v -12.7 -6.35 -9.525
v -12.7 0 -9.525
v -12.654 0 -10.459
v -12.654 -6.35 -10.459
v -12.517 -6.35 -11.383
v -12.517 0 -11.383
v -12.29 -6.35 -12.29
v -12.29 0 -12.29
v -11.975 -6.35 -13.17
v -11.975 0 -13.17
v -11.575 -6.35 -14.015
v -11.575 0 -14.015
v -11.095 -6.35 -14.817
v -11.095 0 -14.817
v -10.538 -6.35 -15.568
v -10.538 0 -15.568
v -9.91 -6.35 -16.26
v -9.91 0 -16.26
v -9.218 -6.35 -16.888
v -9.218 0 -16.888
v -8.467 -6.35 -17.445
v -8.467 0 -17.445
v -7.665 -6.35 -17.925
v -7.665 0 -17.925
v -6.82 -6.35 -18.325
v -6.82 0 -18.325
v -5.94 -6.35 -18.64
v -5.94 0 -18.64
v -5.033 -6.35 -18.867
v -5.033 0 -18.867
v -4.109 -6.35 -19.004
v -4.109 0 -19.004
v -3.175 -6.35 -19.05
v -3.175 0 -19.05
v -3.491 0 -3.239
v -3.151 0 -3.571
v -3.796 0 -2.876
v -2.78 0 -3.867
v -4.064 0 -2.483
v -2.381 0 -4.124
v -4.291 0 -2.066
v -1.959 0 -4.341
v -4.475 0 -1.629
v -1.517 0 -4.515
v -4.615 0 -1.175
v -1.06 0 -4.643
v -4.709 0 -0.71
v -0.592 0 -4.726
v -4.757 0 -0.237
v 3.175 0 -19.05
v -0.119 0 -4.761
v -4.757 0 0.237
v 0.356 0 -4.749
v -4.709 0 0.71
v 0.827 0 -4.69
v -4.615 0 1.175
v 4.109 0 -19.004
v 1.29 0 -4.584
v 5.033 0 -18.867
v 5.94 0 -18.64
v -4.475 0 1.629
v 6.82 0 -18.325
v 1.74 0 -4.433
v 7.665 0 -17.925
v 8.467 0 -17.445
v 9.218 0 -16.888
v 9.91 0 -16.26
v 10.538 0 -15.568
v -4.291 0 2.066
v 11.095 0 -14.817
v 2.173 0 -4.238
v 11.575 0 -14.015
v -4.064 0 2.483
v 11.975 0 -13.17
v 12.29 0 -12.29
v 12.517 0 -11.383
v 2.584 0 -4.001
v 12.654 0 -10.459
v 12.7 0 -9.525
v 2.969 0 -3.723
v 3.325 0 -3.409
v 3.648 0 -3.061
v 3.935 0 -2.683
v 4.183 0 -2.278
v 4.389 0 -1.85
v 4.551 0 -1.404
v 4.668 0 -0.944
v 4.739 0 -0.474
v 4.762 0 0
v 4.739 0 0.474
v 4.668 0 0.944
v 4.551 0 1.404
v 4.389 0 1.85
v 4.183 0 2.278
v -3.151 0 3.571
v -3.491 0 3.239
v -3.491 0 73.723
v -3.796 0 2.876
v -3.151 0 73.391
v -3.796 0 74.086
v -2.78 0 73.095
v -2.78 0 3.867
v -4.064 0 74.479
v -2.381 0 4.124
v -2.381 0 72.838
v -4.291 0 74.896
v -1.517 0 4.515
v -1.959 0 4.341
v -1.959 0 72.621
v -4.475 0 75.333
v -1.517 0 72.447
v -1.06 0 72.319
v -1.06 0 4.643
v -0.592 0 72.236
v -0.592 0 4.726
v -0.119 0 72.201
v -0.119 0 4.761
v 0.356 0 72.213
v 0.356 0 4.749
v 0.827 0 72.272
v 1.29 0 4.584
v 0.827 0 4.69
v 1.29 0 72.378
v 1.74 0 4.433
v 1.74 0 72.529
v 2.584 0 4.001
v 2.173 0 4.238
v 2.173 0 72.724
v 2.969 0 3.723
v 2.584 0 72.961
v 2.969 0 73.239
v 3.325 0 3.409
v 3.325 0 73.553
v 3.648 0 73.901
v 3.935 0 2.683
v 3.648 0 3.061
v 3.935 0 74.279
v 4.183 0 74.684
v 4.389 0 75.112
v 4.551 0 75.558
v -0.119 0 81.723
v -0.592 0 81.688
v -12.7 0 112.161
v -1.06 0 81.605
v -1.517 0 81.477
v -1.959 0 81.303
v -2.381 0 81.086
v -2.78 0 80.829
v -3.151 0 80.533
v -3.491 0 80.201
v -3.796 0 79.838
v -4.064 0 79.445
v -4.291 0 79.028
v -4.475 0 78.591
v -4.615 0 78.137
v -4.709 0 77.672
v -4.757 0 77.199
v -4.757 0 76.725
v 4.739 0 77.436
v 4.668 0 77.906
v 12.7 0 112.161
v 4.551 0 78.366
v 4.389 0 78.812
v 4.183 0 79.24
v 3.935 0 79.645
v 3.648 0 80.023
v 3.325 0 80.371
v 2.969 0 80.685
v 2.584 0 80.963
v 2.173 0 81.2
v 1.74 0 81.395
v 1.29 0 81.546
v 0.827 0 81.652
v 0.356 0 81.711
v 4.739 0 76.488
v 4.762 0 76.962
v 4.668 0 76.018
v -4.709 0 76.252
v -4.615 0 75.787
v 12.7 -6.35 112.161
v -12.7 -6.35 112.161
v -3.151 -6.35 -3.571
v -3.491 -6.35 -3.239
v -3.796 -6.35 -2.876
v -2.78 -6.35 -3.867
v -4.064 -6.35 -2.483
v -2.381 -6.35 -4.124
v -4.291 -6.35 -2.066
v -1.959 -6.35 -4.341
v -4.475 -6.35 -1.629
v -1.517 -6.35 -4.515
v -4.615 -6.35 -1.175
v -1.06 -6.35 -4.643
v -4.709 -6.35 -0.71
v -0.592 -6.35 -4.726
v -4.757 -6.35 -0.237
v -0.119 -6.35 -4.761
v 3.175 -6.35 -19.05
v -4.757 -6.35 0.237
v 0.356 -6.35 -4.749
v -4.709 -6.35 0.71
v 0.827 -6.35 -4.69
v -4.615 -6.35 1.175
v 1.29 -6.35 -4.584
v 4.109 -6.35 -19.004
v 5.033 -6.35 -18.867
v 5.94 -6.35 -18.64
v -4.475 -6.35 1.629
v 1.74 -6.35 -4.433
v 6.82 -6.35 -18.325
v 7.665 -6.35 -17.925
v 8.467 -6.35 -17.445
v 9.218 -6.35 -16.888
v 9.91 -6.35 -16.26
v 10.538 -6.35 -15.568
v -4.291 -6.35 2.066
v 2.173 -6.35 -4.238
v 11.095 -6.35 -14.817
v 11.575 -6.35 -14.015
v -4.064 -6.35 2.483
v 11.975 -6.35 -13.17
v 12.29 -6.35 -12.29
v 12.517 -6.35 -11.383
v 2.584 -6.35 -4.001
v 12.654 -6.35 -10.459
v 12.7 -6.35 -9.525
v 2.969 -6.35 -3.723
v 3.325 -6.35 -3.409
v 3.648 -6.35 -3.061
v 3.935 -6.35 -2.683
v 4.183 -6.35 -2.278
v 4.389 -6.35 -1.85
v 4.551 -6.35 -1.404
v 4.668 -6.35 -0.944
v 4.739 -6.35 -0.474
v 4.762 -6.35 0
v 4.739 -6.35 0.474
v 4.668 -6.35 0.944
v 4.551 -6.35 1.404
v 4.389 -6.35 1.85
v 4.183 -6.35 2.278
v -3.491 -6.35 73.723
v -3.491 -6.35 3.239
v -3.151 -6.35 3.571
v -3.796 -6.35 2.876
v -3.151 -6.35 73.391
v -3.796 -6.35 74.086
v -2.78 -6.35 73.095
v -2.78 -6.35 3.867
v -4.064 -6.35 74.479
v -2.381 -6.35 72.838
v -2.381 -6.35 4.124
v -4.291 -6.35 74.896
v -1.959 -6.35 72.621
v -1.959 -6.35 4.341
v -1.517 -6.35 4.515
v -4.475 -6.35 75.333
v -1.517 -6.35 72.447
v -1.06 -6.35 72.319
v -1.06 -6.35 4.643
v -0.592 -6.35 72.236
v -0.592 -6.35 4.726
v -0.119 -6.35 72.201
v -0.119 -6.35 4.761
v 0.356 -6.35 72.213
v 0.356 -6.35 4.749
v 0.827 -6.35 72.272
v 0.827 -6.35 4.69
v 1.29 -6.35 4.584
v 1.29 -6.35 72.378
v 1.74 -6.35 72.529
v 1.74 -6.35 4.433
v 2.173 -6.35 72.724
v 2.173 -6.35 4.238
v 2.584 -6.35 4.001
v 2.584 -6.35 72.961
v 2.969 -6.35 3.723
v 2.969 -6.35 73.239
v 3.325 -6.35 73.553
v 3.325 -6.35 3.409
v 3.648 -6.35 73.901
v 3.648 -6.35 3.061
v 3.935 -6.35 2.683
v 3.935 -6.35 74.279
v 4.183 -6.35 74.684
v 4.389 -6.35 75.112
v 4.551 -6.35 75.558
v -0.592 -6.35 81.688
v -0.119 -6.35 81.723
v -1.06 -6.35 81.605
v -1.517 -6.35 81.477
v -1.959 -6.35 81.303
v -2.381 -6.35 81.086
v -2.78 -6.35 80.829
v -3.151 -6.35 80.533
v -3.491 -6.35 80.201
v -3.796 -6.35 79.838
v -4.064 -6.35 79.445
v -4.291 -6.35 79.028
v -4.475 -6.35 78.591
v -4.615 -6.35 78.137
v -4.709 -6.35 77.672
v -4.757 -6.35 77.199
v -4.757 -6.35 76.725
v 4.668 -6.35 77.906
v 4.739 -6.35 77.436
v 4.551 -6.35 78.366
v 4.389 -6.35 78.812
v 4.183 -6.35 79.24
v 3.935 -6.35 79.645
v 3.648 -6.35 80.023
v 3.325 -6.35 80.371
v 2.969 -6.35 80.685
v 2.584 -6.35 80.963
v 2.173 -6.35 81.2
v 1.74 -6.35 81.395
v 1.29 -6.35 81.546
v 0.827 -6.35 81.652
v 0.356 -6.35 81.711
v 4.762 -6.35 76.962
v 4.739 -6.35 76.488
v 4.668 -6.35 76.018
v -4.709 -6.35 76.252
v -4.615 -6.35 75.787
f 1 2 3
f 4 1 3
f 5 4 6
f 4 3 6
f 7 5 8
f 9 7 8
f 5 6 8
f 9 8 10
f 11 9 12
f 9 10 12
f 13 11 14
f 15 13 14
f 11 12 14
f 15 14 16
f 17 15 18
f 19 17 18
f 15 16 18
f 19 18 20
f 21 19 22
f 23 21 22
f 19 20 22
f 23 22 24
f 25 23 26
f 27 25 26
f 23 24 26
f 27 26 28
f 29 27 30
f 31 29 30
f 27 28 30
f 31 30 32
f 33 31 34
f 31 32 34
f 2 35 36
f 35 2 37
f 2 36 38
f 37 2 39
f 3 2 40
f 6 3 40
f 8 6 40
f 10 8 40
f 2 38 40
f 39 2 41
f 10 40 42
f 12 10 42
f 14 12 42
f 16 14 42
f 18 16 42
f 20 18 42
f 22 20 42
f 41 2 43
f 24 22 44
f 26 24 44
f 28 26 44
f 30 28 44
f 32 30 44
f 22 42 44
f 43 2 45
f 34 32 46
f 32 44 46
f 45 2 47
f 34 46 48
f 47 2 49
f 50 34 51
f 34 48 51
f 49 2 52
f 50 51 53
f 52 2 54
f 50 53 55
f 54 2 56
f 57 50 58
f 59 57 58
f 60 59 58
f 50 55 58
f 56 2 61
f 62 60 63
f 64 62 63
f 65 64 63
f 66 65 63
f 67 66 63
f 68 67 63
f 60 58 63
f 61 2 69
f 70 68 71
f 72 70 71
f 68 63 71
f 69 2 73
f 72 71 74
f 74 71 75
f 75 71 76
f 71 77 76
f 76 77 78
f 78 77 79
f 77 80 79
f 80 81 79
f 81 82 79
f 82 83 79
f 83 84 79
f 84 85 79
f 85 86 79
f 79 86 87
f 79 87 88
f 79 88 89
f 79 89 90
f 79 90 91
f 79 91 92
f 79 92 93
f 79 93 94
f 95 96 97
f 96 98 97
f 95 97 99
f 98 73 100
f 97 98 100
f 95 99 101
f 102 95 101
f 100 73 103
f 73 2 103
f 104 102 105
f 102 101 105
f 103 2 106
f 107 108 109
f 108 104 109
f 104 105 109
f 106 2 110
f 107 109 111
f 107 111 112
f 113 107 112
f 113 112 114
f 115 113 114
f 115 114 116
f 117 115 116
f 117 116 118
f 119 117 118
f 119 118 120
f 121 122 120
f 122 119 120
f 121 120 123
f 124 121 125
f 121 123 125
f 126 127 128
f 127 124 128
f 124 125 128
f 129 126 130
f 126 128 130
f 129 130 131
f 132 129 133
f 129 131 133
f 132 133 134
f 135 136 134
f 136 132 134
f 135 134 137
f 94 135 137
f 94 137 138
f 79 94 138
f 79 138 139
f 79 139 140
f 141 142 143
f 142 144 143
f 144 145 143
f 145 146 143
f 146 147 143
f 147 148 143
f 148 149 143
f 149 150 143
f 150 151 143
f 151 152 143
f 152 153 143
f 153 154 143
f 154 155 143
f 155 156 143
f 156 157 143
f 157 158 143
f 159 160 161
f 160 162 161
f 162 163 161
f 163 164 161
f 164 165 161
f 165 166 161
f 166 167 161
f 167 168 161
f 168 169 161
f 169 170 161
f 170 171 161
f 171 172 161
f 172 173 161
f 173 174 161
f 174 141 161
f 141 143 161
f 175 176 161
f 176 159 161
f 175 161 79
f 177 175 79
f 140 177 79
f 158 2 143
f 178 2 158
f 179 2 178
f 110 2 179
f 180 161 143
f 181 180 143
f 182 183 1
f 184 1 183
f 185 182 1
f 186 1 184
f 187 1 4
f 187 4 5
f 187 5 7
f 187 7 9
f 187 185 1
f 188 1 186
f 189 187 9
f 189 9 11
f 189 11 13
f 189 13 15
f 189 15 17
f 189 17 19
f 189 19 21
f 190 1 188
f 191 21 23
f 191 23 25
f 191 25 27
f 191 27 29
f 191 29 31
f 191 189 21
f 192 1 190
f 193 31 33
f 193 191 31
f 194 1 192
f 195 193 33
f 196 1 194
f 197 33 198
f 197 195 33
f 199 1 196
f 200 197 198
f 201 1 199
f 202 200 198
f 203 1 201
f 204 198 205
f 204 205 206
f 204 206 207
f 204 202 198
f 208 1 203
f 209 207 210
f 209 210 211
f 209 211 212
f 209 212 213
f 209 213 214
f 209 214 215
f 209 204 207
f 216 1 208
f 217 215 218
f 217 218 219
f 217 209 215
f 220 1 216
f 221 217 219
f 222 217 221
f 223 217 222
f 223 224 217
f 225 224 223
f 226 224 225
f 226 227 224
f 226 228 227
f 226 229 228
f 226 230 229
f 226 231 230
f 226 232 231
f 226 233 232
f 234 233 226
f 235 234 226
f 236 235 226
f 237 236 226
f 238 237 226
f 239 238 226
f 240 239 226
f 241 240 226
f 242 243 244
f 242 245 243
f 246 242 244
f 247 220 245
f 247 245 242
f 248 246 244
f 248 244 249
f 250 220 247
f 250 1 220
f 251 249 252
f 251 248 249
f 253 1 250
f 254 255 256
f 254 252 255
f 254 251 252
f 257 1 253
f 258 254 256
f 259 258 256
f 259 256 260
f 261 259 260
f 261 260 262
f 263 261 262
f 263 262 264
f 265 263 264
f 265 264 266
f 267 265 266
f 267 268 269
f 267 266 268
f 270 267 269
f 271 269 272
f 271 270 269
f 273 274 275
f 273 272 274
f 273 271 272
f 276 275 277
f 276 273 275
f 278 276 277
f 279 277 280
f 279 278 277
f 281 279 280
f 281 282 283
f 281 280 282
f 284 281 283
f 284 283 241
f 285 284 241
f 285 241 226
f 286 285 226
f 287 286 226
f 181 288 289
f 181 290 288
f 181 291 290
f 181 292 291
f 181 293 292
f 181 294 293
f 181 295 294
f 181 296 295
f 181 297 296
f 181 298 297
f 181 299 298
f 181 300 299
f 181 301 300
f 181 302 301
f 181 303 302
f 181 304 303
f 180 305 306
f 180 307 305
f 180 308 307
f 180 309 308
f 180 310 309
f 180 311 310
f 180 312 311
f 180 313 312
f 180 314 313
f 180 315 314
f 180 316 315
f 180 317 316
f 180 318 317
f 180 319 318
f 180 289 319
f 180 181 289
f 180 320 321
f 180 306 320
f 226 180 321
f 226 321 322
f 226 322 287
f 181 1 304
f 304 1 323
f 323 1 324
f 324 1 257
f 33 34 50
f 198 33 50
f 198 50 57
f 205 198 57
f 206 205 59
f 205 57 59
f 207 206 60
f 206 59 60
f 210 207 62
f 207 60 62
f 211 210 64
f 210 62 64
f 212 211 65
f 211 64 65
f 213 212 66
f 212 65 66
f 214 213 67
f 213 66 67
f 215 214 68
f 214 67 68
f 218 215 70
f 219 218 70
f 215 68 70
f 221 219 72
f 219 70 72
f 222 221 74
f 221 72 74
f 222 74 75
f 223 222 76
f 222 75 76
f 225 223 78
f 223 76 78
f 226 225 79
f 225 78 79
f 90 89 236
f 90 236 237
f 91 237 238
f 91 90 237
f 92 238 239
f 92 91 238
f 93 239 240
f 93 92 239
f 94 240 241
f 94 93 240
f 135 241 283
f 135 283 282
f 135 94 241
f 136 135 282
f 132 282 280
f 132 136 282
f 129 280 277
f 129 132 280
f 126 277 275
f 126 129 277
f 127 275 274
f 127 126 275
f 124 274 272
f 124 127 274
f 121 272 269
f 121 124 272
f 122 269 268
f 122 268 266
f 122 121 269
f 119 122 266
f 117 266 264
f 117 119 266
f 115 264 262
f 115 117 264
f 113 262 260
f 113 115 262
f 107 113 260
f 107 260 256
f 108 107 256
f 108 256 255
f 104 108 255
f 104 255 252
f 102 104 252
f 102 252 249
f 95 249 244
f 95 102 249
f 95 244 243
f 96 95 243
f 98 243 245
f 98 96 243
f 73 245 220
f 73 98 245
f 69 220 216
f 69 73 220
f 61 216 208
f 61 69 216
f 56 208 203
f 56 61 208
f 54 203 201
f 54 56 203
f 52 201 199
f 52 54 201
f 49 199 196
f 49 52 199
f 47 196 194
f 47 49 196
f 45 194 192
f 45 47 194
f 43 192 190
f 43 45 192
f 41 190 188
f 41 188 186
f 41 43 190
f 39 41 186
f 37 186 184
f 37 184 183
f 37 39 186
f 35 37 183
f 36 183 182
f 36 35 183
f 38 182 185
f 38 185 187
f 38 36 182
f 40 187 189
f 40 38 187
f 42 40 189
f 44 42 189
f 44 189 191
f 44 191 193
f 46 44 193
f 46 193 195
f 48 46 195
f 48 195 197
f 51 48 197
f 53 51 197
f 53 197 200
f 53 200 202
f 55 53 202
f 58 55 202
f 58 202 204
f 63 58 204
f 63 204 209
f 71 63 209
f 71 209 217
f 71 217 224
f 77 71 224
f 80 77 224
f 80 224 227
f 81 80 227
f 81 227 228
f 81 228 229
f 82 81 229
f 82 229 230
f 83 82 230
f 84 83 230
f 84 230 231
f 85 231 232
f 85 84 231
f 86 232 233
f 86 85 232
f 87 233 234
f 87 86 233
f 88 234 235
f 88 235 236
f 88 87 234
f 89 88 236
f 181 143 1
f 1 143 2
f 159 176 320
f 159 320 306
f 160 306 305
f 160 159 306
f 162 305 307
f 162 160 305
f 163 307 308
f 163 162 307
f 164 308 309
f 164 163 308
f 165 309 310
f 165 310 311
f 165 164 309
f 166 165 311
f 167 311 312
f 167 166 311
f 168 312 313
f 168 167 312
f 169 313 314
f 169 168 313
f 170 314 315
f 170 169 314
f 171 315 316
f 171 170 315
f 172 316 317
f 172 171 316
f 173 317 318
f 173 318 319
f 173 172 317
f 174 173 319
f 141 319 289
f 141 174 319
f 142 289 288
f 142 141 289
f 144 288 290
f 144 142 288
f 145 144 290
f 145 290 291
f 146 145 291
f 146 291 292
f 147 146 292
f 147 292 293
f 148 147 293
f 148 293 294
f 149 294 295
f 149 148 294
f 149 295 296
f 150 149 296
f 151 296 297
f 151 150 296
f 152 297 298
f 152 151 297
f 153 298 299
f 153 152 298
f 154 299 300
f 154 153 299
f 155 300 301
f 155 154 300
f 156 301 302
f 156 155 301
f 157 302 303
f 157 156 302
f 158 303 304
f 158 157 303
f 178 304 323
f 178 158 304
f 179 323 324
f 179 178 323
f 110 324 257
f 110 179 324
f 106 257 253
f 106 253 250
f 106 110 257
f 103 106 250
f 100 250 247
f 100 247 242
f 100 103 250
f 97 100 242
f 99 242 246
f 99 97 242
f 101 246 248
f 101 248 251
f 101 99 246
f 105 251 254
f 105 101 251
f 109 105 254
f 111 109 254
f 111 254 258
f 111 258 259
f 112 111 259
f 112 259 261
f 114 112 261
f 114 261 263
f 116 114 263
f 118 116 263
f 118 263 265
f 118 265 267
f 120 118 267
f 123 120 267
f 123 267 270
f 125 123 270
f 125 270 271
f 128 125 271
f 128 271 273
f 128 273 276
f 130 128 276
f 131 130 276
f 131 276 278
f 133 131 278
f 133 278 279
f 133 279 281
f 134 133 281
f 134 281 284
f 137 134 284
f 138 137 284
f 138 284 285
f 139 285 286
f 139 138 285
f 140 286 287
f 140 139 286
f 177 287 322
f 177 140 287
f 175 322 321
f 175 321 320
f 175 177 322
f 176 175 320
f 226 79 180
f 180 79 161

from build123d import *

# Parameters (mm, degrees)
F0_R     = 4.7625
F1_DEPTH = 6.35


with BuildPart() as f1:
    # F0 (on Front) → F1 (new body)
    with BuildSketch(Plane.XZ):
        with BuildLine():
            ThreePointArc((3.175, -19.05), (9.910192, -16.260192), (12.7, -9.525))
            Line((12.7, -9.525), (12.7, 112.161003))
            Line((12.7, 112.161003), (-12.7, 112.161003))
            Line((-12.7, 112.161003), (-12.7, -9.525))
            ThreePointArc((-12.7, -9.525), (-9.910192, -16.260192), (-3.175, -19.05))
            Line((-3.175, -19.05), (3.175, -19.05))
        make_face()
        Circle(F0_R, mode=Mode.SUBTRACT)
        with Locations((0, 76.962)):
            Circle(F0_R, mode=Mode.SUBTRACT)
    extrude(amount=F1_DEPTH)


solid = f1.part
